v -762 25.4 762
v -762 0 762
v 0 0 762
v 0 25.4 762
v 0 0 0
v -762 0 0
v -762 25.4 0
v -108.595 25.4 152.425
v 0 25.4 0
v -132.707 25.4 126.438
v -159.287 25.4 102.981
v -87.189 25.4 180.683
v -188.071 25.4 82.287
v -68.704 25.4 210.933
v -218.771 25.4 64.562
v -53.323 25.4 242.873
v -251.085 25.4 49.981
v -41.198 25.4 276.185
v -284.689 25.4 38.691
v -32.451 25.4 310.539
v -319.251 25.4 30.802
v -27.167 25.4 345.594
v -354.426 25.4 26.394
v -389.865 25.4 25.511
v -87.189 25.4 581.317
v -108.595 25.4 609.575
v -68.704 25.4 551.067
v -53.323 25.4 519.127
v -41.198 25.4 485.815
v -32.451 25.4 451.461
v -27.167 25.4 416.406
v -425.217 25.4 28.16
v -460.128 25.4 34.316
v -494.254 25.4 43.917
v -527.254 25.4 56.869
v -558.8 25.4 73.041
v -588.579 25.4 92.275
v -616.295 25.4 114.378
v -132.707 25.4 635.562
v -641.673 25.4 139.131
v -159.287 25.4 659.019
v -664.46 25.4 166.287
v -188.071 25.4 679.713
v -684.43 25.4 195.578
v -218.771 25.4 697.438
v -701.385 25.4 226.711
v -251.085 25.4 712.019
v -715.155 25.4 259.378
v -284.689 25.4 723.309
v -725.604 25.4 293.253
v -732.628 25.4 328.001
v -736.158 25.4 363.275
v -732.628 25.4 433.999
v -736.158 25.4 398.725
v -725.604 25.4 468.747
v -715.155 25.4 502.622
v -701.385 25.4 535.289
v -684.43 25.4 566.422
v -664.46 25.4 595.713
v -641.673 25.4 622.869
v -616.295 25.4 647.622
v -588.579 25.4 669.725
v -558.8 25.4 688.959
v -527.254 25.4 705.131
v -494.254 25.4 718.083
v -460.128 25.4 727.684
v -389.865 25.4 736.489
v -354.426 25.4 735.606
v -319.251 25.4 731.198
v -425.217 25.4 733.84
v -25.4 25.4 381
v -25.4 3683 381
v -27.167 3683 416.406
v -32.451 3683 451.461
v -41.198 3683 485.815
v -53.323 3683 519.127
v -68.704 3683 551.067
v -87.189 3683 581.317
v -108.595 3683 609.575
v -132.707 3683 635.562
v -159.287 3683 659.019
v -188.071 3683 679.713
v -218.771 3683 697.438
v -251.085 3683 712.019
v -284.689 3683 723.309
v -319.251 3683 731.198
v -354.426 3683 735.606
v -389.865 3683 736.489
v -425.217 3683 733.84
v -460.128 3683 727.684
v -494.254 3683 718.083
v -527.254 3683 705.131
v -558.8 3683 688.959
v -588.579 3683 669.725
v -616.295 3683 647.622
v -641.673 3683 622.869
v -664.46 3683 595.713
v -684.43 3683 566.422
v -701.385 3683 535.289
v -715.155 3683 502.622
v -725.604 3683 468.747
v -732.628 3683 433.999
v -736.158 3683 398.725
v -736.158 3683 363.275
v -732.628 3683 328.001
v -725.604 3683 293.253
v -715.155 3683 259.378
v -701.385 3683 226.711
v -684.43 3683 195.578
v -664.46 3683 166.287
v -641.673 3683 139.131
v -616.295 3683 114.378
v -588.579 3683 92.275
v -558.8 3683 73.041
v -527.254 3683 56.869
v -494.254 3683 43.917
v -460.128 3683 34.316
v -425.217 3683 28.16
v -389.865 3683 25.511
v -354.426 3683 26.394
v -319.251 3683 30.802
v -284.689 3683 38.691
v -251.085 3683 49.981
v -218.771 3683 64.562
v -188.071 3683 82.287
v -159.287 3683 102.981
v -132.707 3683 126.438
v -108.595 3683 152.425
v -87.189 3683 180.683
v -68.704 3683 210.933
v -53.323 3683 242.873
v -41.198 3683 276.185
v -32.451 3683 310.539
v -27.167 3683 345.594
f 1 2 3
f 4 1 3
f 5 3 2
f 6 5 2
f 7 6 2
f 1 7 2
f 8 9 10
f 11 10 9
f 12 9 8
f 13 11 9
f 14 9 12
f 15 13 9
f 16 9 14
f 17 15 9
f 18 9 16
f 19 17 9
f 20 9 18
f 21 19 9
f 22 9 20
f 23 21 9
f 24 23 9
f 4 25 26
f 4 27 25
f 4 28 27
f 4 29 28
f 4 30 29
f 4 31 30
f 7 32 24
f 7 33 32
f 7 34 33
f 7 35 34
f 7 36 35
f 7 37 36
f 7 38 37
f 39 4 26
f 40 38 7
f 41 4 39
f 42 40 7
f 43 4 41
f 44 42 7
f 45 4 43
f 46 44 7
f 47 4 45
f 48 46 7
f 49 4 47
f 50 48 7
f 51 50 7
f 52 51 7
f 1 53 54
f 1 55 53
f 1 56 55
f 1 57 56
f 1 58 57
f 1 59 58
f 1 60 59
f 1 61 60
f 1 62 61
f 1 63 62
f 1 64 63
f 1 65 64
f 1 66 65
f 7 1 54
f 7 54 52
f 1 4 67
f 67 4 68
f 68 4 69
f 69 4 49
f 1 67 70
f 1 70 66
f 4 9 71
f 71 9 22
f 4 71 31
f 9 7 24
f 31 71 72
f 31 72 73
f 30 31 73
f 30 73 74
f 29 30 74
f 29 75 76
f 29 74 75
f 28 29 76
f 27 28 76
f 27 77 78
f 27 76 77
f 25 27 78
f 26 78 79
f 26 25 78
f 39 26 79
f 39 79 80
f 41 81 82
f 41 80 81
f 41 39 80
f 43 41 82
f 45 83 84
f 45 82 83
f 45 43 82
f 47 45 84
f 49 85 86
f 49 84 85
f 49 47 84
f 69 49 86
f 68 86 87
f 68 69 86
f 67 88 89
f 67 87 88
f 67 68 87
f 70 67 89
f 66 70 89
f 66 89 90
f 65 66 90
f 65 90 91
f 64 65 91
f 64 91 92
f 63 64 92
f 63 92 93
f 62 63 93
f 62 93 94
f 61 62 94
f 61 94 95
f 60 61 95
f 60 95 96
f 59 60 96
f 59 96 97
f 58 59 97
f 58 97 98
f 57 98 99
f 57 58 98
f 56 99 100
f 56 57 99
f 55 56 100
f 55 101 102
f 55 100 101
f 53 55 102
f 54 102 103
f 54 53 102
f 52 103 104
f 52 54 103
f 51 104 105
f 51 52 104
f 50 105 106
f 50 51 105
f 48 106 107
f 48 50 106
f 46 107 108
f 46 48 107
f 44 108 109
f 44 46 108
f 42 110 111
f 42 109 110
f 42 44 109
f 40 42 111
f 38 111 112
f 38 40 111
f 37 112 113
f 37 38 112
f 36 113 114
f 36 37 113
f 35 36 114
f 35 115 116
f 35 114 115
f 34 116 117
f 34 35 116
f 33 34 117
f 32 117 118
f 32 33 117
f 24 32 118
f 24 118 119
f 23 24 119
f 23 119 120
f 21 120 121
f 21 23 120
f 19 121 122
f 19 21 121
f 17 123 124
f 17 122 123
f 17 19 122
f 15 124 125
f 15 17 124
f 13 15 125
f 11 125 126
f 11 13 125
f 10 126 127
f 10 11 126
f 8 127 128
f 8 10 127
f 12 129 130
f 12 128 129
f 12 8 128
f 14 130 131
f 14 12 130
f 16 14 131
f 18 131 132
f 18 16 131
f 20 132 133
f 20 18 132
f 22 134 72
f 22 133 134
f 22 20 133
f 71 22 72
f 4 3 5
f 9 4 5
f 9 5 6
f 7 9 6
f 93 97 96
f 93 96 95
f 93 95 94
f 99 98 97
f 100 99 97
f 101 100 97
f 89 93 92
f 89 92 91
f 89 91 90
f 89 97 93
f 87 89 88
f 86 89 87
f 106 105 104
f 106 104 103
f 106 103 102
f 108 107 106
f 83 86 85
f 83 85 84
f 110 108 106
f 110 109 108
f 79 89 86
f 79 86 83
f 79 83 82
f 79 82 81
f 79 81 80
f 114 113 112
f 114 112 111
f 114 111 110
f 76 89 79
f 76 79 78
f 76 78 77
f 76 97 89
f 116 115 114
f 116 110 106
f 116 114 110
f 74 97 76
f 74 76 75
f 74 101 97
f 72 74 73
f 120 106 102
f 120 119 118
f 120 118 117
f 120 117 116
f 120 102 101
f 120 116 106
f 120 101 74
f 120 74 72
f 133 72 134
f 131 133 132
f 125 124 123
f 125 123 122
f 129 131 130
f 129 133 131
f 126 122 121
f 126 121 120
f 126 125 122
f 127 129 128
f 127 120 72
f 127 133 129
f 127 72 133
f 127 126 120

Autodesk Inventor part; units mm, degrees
ref_plane "YZ Plane" through (0, 0, 0) normal (1, 0, 0) x (0, 1, 0)
ref_plane "XZ Plane" through (0, 0, 0) normal (0, 1, 0) x (-1, 0, 0)
ref_plane "XY Plane" through (0, 0, 0) normal (0, 0, 1) x (1, 0, 0)
sketch "Sketch1" plane through (0, 0, 0) normal (0, 1, 0) x (-1, 0, 0)
  line L0 (0, 0) -> (762, 0)
  line L1 (762, 0) -> (762, 762)
  line L2 (762, 762) -> (0, 762)
  line L3 (0, 762) -> (0, 0)
  dimension "d0" = 762
  dimension "d1" = 762
extrude "Extrusion1" add sketch "Sketch1" along normal blind 25.4
sketch "Sketch2" plane through (0, 25.4, 0) normal (0, 1, 0) x (1, 0, 0)
  circle A0 centre (-381, -381) radius 355.6
  dimension "d4" = 711.2
extrude "Extrusion2" add sketch "Sketch2" along normal blind 3657.6
properties part number "tree" material "Wood (Walnut)"
